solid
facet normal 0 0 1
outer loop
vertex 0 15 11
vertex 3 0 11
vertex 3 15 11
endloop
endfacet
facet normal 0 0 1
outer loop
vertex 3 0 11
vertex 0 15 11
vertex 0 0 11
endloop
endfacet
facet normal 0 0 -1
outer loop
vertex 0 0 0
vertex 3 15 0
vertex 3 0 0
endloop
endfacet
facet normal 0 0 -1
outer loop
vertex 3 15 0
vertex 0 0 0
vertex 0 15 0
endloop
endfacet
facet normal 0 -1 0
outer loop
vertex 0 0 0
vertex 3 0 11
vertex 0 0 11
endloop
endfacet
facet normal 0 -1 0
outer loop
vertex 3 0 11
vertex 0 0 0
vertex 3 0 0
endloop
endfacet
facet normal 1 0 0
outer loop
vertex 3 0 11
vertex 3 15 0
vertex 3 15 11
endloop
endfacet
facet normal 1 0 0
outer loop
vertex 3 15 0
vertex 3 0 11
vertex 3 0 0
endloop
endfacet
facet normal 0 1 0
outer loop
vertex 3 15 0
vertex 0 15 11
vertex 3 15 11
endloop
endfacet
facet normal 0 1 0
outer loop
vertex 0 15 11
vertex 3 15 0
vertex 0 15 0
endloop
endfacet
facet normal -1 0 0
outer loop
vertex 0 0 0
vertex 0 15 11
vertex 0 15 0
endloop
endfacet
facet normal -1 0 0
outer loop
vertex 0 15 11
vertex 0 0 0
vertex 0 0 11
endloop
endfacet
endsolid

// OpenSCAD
// Generated by SolidPython 1.0.1 on 2020-07-29 00:46:54


cube(size = [3, 15, 11]);
/***********************************************
*********      SolidPython code:      **********
************************************************
 
# import packages: SolidPython
from solid import *
from solid.utils import *
from itertools import chain, combinations, permutations


class Resize:

    def __init__(self, scad_file):
        self.scad_file = scad_file
        #self.scad_file = import_scad(scad_file)
        # cone/cylinder param:
        self.r1 = 0
        self.r2 = 0
        self.h = 0
        # rectangular prism param:
        self.w = 0
        self.l = 0
        # ellipse param:
        self.r = 0

    # import OpenScad code (file name corresponds to shape)


    # classify shape + parameters
    def assign(self, param1, param2, param3):
        if self.scad_file == 'cone.scad':
            self.r1 = param1
            self.r2 = param2
            self.h = param3
        elif self.scad_file == 'cylinder.scad':
            self.r1 = param1
            self.r2 = param2
            self.h = param3
        elif self.scad_file == 'rectangularPrism.scad':
            self.h = param1
            self.l = param2
            self.w = param3
        else:
            self.r = param1
            self.h = param2

    # resize parameters
    def iterate(self):
        x = range(3, 20, 2)
        i = 1
        if self.scad_file == 'cone.scad':
            tempList = list(permutations(x, 2))
            for temp in tempList:
                param1 = temp[0]
                param2 = temp[1]
                filepath = 'produced_scad_files/' + 'cone' + str(param1) + '_' + str(param2) + '_' + '.scad'
                scad_render_to_file(cylinder(h=param1, r1=param2, r2=0), filepath)

        elif self.scad_file == 'cylinder.scad':
            tempList = list(permutations(x, 3))
            for temp in tempList:
                param1 = temp[0]
                param2 = temp[1]
                filepath = 'produced_scad_files/' + 'cylinder' + str(param1) + '_' + str(param2) + '_' + '.scad'
                scad_render_to_file(cylinder(h=param1, r1=param2, r2=param2), filepath)

        elif self.scad_file == 'rectangularPrism.scad':
            tempList = list(permutations(x, 3))
            for temp in tempList:
                param1 = temp[0]
                param2 = temp[1]
                param3 = temp[2]
                filepath = 'produced_scad_files/' + 'rectangularPrism' + str(param1) + '_' + str(param2) + '_' + str(
                    param3) + '.scad'
                scad_render_to_file(cube(size=(param1, param2, param3)), filepath)

        elif self.scad_file == 'ellipse.scad':
            tempList = list(permutations(x, 4))
            for temp in tempList:
                param1 = temp[0]
                param2 = temp[1]
                param3 = temp[2]
                param4 = temp[3]
                filepath = 'produced_scad_files/' + 'ellipse' + str(param1) + '_' + str(param2) + '_' + str(param3) + '_' + str(param4) + '.scad'
                scad_render_to_file(scale([param1, param2, param3])(sphere(r=param4)), filepath)

    def render_to_scadfile(self):
        scad_render_to_file(scad, 'example.scad') 
 
************************************************/
